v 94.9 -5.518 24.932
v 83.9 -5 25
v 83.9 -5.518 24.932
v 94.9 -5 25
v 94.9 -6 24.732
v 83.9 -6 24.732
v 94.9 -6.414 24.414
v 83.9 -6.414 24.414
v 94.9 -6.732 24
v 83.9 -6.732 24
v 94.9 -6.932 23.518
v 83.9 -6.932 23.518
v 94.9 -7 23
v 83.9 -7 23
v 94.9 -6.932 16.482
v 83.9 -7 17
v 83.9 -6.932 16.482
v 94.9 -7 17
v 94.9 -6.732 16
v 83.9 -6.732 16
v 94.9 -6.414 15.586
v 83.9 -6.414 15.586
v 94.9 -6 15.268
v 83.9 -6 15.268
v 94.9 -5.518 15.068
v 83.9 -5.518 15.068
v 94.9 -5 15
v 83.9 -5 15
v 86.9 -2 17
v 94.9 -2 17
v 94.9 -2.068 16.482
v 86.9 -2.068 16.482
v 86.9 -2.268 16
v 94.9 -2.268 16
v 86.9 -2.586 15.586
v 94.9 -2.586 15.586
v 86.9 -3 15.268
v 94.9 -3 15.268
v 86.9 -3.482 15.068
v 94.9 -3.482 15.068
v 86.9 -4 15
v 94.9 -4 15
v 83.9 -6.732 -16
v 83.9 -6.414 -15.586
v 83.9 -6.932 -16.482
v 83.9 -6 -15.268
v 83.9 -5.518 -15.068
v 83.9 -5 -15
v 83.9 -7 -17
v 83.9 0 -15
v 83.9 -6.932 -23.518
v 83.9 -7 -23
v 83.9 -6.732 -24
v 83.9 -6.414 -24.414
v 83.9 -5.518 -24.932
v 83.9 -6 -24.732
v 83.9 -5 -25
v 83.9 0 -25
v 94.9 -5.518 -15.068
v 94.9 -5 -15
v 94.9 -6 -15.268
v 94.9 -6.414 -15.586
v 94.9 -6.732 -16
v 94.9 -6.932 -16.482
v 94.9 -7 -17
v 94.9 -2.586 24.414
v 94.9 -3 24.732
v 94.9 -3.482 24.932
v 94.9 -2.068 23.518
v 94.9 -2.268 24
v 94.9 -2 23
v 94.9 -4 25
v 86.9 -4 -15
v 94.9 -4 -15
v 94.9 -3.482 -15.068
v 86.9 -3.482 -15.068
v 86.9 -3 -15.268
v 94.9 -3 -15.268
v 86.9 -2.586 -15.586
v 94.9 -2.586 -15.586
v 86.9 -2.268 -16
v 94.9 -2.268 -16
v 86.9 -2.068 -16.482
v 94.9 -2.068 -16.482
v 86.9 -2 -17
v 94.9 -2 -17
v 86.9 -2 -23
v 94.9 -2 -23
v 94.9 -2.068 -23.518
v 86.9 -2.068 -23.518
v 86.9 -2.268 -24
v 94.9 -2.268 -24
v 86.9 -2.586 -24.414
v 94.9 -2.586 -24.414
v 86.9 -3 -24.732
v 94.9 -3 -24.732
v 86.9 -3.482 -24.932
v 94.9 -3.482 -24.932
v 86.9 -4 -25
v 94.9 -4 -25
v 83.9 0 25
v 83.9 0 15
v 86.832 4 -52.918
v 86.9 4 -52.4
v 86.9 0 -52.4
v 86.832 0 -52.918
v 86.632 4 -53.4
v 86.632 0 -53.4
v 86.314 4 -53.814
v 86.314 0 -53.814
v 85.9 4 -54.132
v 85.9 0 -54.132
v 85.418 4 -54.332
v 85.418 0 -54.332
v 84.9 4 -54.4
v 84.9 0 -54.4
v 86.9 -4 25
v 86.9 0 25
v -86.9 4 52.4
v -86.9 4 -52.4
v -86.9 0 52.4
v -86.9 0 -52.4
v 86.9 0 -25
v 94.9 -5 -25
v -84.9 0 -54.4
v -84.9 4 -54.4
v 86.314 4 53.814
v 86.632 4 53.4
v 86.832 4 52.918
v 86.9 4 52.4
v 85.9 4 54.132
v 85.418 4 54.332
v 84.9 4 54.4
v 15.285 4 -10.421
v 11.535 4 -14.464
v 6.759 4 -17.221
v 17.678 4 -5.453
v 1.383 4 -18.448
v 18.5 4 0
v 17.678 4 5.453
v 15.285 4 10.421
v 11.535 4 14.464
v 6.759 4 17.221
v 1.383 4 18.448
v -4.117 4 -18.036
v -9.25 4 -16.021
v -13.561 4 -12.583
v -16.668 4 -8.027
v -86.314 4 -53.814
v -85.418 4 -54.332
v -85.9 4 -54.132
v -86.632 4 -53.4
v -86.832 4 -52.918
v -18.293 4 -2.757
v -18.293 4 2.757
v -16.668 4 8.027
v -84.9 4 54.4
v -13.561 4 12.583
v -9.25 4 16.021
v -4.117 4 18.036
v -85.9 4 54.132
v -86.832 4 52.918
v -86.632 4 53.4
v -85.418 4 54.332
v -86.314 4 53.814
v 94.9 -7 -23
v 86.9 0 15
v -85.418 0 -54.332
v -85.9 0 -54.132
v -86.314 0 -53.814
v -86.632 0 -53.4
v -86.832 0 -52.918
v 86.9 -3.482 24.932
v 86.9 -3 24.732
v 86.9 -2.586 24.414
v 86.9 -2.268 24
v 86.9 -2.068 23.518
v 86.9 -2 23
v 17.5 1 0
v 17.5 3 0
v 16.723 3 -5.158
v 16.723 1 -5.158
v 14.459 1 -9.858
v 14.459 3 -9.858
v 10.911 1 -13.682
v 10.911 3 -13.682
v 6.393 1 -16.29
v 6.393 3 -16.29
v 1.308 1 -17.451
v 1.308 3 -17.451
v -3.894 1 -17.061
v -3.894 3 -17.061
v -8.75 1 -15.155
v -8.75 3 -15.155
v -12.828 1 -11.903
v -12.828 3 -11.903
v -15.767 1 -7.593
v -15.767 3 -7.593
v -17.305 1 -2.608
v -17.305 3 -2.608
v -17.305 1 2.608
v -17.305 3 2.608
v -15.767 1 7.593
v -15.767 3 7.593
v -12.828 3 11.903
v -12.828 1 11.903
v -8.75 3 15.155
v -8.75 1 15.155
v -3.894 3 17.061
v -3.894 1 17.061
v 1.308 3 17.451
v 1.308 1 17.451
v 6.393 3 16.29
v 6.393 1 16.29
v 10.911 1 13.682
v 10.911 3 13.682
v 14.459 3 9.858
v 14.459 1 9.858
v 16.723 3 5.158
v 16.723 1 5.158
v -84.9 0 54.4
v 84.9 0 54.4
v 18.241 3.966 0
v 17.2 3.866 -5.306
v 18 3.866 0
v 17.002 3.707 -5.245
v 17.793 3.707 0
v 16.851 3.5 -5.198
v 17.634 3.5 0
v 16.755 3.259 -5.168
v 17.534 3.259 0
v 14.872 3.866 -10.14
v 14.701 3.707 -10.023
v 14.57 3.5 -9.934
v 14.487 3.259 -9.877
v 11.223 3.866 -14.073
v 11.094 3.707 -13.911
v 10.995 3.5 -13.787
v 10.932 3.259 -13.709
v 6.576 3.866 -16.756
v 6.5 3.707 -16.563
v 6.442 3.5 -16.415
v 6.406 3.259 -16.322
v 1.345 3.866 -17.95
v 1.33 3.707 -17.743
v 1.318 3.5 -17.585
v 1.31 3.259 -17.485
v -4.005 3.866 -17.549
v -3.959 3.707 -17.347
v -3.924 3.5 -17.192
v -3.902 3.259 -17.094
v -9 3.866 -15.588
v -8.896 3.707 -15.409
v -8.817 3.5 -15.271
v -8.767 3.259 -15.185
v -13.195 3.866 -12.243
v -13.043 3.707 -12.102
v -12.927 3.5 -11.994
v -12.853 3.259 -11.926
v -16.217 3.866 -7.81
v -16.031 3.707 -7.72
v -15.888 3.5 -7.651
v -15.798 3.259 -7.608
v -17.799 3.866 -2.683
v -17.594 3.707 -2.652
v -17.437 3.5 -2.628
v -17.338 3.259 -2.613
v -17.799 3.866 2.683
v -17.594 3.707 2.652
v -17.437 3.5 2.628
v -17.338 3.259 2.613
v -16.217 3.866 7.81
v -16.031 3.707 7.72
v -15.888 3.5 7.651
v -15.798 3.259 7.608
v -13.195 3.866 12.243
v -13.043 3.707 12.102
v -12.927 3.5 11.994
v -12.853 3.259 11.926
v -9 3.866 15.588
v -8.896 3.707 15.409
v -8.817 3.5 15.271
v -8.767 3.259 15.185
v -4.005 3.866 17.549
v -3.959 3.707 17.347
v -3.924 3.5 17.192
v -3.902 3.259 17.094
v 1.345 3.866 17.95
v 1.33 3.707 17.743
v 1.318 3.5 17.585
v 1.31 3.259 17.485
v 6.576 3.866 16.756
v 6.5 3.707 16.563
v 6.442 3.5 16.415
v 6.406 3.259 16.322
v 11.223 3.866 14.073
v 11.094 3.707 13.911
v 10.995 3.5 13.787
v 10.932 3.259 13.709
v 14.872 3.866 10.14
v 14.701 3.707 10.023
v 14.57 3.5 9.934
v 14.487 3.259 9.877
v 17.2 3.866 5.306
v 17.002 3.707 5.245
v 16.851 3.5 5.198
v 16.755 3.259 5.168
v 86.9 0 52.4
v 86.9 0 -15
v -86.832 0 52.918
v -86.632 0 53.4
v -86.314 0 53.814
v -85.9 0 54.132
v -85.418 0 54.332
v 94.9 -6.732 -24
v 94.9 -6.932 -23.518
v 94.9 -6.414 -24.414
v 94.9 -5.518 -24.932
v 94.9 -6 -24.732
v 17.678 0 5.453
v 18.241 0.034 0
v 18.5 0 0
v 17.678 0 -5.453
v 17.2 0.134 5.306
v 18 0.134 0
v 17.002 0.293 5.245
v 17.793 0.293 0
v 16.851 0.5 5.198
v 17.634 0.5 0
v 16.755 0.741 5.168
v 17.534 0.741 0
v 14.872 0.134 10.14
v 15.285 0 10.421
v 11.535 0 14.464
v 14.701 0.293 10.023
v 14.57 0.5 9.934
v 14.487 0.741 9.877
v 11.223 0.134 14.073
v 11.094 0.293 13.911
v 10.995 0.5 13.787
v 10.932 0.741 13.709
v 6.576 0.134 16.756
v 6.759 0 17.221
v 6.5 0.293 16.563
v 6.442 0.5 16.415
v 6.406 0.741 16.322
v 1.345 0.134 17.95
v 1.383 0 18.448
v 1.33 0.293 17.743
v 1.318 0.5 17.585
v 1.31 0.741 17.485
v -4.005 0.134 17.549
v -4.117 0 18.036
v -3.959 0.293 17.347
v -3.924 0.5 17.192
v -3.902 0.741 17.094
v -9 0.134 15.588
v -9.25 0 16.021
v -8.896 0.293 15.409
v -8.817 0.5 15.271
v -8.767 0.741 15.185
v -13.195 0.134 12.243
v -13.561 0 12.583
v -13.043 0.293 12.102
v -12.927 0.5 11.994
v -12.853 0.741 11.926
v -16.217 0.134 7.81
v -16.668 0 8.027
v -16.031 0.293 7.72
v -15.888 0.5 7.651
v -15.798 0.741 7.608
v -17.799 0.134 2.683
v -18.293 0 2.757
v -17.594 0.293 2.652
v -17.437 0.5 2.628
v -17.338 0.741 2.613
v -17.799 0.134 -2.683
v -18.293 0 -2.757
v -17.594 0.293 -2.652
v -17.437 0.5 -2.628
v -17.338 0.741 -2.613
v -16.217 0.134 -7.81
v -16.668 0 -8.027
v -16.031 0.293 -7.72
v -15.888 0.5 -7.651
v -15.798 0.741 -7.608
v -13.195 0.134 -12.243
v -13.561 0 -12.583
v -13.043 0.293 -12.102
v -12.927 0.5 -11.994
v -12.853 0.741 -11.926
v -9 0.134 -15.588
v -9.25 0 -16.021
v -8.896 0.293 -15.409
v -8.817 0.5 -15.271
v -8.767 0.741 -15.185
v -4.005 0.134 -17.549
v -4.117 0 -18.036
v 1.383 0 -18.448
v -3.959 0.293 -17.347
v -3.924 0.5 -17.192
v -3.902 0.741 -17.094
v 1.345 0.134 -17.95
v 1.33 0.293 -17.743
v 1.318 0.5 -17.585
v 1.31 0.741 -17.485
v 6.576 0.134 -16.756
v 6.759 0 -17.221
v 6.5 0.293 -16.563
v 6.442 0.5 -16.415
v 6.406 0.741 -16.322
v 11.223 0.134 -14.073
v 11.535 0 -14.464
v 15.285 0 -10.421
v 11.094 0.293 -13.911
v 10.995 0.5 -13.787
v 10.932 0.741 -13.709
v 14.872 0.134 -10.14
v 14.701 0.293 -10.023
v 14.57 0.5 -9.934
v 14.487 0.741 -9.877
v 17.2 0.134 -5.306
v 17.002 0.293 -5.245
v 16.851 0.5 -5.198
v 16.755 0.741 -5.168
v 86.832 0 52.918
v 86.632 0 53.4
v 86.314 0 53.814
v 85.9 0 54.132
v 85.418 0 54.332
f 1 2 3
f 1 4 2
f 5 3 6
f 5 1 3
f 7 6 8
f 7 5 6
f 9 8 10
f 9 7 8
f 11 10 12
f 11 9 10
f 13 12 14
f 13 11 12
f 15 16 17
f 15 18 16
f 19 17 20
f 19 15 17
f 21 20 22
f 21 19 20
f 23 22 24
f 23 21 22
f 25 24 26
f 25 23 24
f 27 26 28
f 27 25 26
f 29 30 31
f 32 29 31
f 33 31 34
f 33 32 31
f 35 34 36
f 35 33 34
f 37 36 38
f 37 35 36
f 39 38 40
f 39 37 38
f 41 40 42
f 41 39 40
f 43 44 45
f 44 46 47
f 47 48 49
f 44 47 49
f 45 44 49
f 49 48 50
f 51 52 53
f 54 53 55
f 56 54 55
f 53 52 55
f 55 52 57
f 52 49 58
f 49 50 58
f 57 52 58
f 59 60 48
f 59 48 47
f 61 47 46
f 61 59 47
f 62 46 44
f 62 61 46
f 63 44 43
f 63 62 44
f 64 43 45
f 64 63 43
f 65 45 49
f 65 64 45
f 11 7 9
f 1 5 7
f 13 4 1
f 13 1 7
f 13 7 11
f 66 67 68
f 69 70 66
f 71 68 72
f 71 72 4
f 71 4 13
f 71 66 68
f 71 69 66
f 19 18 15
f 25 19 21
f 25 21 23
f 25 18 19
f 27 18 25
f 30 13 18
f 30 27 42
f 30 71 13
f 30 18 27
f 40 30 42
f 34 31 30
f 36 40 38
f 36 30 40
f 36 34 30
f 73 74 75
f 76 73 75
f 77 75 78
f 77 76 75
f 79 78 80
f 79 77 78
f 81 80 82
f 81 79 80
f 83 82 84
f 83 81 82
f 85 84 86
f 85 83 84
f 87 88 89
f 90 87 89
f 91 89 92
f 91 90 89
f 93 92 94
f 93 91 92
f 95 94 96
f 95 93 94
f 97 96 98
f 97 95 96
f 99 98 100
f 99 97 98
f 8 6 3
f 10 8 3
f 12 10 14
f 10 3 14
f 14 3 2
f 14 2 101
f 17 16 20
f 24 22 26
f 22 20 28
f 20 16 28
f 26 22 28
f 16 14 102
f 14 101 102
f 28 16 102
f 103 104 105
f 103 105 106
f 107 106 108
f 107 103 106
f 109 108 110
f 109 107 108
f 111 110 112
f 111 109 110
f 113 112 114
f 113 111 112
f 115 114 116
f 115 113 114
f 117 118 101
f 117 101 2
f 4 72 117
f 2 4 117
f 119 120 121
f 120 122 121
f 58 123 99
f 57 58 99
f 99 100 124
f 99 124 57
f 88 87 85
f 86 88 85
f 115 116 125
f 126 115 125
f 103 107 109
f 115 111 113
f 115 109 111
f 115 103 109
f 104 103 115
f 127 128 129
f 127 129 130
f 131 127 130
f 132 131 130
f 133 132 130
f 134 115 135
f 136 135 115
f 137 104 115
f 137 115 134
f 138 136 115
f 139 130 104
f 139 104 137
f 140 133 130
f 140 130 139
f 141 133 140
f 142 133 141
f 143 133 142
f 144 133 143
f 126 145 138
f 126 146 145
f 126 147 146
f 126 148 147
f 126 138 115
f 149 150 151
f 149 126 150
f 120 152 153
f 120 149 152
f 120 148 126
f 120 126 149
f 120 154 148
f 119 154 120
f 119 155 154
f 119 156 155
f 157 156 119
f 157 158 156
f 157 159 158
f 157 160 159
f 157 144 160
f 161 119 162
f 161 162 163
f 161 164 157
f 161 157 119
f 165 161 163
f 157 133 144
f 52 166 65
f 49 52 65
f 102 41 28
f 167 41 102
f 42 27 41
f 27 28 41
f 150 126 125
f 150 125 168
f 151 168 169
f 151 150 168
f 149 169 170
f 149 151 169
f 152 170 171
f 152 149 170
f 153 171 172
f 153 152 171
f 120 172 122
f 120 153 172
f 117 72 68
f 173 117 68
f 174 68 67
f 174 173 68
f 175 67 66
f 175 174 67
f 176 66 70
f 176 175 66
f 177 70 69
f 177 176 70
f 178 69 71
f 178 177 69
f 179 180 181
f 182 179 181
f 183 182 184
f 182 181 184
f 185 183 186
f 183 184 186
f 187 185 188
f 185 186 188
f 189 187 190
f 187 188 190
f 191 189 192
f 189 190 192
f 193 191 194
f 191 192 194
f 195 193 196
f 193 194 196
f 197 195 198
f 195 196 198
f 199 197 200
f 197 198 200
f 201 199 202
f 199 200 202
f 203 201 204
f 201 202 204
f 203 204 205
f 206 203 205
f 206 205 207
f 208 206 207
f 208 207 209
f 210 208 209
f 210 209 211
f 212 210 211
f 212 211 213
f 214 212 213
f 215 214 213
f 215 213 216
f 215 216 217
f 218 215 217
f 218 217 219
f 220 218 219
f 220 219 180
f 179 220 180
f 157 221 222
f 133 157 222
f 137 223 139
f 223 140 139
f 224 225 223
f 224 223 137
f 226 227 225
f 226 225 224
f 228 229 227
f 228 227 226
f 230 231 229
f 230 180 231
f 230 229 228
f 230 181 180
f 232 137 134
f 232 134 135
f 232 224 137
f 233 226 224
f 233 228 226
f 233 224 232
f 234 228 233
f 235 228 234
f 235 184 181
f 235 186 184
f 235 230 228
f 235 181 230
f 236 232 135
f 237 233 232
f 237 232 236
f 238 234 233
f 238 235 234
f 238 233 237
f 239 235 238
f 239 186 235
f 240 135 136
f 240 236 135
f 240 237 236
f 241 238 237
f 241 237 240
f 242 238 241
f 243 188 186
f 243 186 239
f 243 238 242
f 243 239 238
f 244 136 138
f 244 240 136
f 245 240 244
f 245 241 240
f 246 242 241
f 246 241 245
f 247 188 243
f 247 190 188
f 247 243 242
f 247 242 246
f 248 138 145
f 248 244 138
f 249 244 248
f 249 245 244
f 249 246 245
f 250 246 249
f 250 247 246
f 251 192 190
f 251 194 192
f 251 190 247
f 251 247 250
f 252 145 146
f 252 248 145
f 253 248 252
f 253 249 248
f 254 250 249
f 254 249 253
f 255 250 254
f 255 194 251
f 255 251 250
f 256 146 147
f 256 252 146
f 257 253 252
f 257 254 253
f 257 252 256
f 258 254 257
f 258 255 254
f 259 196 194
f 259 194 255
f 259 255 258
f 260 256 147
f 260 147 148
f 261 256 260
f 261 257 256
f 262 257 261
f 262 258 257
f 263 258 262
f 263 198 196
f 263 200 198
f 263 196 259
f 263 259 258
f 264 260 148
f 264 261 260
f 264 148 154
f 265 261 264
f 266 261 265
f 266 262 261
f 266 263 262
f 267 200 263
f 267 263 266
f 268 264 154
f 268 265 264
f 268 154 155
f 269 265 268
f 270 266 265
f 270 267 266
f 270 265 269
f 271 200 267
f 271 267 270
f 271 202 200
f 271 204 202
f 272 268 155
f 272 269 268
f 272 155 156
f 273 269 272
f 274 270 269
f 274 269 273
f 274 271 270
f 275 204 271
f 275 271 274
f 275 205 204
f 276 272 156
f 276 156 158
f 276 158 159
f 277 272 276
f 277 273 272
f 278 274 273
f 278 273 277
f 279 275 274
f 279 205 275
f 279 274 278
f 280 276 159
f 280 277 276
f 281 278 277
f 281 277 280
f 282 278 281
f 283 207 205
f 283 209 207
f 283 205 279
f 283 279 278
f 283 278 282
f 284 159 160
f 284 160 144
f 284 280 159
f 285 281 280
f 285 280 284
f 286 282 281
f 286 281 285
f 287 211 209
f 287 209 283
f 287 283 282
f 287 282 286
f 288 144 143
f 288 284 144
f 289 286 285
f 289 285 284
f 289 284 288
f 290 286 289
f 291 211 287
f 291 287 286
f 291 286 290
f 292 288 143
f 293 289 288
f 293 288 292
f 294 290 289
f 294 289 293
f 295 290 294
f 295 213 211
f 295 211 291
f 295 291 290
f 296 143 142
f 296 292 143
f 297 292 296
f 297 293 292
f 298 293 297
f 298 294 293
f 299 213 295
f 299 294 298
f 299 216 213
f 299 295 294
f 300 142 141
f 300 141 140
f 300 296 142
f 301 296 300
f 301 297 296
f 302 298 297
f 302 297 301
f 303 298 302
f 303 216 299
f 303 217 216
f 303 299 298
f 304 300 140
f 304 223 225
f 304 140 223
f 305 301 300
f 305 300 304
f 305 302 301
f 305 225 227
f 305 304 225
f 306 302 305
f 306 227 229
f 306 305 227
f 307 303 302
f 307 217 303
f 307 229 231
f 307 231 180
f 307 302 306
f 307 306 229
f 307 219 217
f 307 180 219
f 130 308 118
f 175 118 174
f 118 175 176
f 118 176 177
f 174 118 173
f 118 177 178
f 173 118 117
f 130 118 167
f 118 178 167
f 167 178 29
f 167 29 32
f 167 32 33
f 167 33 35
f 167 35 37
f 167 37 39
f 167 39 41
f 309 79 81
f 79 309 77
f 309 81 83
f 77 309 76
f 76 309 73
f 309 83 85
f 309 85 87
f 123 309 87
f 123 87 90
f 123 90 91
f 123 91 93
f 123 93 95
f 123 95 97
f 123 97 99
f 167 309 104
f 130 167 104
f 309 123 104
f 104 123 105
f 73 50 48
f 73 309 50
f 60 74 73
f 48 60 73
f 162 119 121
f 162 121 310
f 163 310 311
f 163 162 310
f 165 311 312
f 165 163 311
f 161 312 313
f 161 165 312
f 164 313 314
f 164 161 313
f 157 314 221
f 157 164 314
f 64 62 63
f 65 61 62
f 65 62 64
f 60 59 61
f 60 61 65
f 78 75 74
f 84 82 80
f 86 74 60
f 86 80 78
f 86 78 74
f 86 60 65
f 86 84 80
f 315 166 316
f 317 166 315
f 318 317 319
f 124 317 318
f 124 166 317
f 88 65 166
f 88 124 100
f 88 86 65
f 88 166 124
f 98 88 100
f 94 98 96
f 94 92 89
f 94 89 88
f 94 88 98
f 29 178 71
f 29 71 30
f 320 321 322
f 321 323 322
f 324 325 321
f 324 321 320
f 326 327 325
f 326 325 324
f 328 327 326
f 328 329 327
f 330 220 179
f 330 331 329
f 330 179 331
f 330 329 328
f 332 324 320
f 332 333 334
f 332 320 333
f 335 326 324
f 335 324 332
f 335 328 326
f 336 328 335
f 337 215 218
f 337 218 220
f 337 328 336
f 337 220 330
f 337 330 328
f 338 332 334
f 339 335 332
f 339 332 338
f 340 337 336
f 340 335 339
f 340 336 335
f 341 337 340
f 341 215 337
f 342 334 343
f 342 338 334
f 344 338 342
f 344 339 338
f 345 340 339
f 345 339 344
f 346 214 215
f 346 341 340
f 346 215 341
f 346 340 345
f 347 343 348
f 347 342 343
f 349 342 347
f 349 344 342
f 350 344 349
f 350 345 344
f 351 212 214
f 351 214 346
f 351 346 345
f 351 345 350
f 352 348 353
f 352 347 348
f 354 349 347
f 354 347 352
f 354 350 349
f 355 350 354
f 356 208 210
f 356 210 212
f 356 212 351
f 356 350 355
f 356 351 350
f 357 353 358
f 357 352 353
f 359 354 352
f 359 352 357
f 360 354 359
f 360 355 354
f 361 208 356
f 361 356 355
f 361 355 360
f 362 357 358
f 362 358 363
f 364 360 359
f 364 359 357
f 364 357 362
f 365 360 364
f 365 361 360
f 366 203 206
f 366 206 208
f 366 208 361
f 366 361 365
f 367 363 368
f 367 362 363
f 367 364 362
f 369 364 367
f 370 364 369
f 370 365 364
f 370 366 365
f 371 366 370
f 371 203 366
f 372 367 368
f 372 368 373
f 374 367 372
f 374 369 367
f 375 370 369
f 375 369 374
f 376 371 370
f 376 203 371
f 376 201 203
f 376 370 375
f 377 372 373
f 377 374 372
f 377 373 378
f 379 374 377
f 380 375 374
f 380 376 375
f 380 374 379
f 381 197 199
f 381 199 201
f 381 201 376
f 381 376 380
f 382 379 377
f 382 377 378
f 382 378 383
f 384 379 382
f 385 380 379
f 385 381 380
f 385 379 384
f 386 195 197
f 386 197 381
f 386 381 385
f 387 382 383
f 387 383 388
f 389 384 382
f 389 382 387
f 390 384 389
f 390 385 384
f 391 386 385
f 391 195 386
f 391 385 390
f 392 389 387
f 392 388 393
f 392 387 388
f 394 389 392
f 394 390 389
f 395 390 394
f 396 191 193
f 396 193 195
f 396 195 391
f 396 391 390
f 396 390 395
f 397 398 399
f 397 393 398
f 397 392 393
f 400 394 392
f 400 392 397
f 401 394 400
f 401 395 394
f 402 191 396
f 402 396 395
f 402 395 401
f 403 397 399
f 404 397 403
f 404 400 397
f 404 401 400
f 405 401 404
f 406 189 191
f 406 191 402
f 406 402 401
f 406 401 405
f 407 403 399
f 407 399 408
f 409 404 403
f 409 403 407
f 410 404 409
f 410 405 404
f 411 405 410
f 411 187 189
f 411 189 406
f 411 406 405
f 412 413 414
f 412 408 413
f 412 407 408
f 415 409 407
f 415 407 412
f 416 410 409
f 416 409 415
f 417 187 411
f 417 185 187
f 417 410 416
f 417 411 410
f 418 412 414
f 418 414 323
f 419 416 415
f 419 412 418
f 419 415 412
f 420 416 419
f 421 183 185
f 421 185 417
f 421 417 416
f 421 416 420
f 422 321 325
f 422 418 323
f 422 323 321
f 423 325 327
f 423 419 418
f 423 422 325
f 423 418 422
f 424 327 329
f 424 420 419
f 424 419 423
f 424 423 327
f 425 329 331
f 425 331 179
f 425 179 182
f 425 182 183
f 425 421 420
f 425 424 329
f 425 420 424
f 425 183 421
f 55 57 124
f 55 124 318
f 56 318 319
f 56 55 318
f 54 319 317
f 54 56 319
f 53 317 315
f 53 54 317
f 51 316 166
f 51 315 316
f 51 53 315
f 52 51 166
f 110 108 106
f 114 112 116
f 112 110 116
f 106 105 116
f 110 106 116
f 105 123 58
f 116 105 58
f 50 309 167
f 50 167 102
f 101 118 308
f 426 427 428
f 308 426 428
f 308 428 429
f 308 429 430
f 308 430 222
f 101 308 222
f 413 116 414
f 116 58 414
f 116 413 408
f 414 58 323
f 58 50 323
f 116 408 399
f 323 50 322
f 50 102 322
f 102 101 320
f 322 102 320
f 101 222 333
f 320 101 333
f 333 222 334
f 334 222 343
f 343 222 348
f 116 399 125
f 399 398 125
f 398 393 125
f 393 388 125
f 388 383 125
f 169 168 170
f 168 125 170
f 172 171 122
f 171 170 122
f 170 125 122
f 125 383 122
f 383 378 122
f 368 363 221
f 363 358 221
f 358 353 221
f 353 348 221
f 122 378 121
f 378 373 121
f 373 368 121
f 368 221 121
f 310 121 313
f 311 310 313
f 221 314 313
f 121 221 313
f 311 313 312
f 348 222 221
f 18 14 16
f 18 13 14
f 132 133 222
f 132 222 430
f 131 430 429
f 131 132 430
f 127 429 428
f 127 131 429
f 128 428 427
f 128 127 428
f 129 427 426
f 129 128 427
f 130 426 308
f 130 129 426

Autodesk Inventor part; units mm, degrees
ref_plane "YZ Plane" through (0, 0, 0) normal (1, 0, 0) x (0, 1, 0)
ref_plane "XZ Plane" through (0, 0, 0) normal (0, 1, 0) x (-1, 0, 0)
ref_plane "XY Plane" through (0, 0, 0) normal (0, 0, 1) x (1, 0, 0)
sketch "Sketch1" plane through (0, 0, 0) normal (0, 1, 0) x (-1, 0, 0)
  line L0 (86.9, 54.4) -> (-86.9, 54.4)
  line L1 (-86.9, 54.4) -> (-86.9, -54.4)
  line L2 (-86.9, -54.4) -> (86.9, -54.4)
  line L3 (86.9, -54.4) -> (86.9, 54.4)
  line L4 (86.9, 54.4) -> (-86.9, -54.4) construction
  line L5 (-86.9, 54.4) -> (86.9, -54.4) construction
  point P0 (0, 0)
  dimension "d0" = 108.8
  dimension "d1" = 173.8
extrude "Extrusion1" add sketch "Sketch1" along normal blind 4
sketch "Sketch2" plane through (86.9, 0, 54.4) normal (1, 0, 0) x (0, 0, -1)
  line L0 (39.4, 6.5316) -> (69.4, 6.5316)
  line L1 (69.4, 6.5316) -> (69.4, -6.5316)
  line L2 (69.4, -6.5316) -> (39.4, -6.5316)
  line L3 (39.4, -6.5316) -> (39.4, 6.5316)
  line L4 (39.4, 6.5316) -> (69.4, -6.5316) construction
  line L5 (69.4, 6.5316) -> (39.4, -6.5316) construction
  line L6 (69.4, 0) -> (79.4, 0)
  line L7 (79.4, 0) -> (79.4, -2)
  line L8 (79.4, -2) -> (69.4, -2)
  line L9 (69.4, -2) -> (69.4, 0)
  line L10 (39.4, 0) -> (29.4, 0)
  line L11 (29.4, 0) -> (29.4, -2)
  line L12 (29.4, -2) -> (39.4, -2)
  line L13 (39.4, -2) -> (39.4, 0)
  line L14 (69.4, -2) -> (79.4, -2)
  line L15 (79.4, -2) -> (79.4, -7)
  line L16 (79.4, -7) -> (69.4, -7)
  line L17 (69.4, -7) -> (69.4, -2)
  line L18 (39.4, -2) -> (29.4, -2)
  line L19 (29.4, -2) -> (29.4, -7)
  line L20 (29.4, -7) -> (39.4, -7)
  line L21 (39.4, -7) -> (39.4, -2)
  point P0 (54.4, 0)
  point P1 (69.4, -6.5316)
  dimension "d4" = 30
  dimension "d5" = 2
  dimension "d6" = 2
  dimension "d7" = 5
  dimension "d8" = 10
  dimension "d9" = 5
  dimension "d10" = 10
  dimension "d11" = 10
  dimension "d12" = 10
extrude "Extrusion2" add sketch "Sketch2" against normal blind 3 contours L3 L12 L11 L10 | L6 L7 L8 L1 | L3 L21 L20 L19 L12 | L8 L15 L16 L17 L1
sketch "Sketch3" plane through (86.9, 0, -54.4) normal (1, 0, 0) x (0, 0, -1)
  line L0 (-79.4, -2) -> (-69.4, -2) projected
  line L1 (-69.4, -7) -> (-69.4, -2) projected
  line L2 (-79.4, -7) -> (-69.4, -7) projected
  line L3 (-79.4, -2) -> (-79.4, -7) projected
  line L4 (-29.4, -2) -> (-39.4, -2) projected
  line L5 (-29.4, -2) -> (-29.4, -7) projected
  line L6 (-29.4, -7) -> (-39.4, -7) projected
  line L7 (-39.4, -7) -> (-39.4, -2) projected
  line L8 (-79.4, -7) -> (-69.4, -7) projected
  line L9 (-77.4, -2) -> (-71.4, -2)
  line L10 (-69.4, -4) -> (-69.4, -5)
  line L11 (-71.4, -7) -> (-77.4, -7)
  line L12 (-79.4, -5) -> (-79.4, -4)
  line L13 (-37.4, -2) -> (-31.4, -2)
  line L14 (-29.4, -4) -> (-29.4, -5)
  line L15 (-31.4, -7) -> (-37.4, -7)
  line L16 (-39.4, -5) -> (-39.4, -4)
  arc A0 (-37.4, -2) -> (-39.4, -4) centre (-37.4, -4) ccw
  arc A1 (-29.4, -4) -> (-31.4, -2) centre (-31.4, -4) ccw
  arc A2 (-31.4, -7) -> (-29.4, -5) centre (-31.4, -5) ccw
  arc A3 (-39.4, -5) -> (-37.4, -7) centre (-37.4, -5) ccw
  arc A4 (-77.4, -2) -> (-79.4, -4) centre (-77.4, -4) ccw
  arc A5 (-69.4, -4) -> (-71.4, -2) centre (-71.4, -4) ccw
  arc A6 (-71.4, -7) -> (-69.4, -5) centre (-71.4, -5) ccw
  arc A7 (-79.4, -5) -> (-77.4, -7) centre (-77.4, -5) ccw
  point P0 (-54.4, 0)
  dimension "d15" = 2
extrude "Extrusion3" add sketch "Sketch3" along normal blind 8 contours L0 A5 L1 A6 L2 A7 L3 A4 | A1 L5 A2 L6 A3 L7 A0 L4
sketch "Sketch4" plane through (94.9, 0, -54.4) normal (1, 0, 0) x (0, 0, -1)
  line L0 (-77.4, -7) -> (-71.4, -7) projected
  arc A0 (-71.4, -7) -> (-69.4, -5) centre (-71.4, -5) ccw projected
  line L1 (-69.4, -5) -> (-69.4, -4) projected
  arc A1 (-69.4, -4) -> (-71.4, -2) centre (-71.4, -4) ccw projected
  line L2 (-71.4, -2) -> (-77.4, -2) projected
  arc A2 (-77.4, -2) -> (-79.4, -4) centre (-77.4, -4) ccw projected
  line L3 (-79.4, -4) -> (-79.4, -5) projected
  arc A3 (-79.4, -5) -> (-77.4, -7) centre (-77.4, -5) ccw projected
  line L4 (-37.4, -7) -> (-31.4, -7) projected
  arc A4 (-31.4, -7) -> (-29.4, -5) centre (-31.4, -5) ccw projected
  line L5 (-29.4, -5) -> (-29.4, -4) projected
  arc A5 (-29.4, -4) -> (-31.4, -2) centre (-31.4, -4) ccw projected
  line L6 (-31.4, -2) -> (-37.4, -2) projected
  arc A6 (-37.4, -2) -> (-39.4, -4) centre (-37.4, -4) ccw projected
  line L7 (-39.4, -4) -> (-39.4, -5) projected
  arc A7 (-39.4, -5) -> (-37.4, -7) centre (-37.4, -5) ccw projected
  line L8 (-79.4, 0) -> (-79.4, -4) projected
  line L9 (-79.4, -2) -> (-69.4, -2)
  line L10 (-69.4, -2) -> (-69.4, -8.3081)
  line L11 (-69.4, -8.3081) -> (-79.4, -8.3081)
  line L12 (-79.4, -8.3081) -> (-79.4, -2)
  line L13 (-39.4, -7) -> (-39.4, 0) projected
  line L14 (-39.4, -2) -> (-29.4, -2)
  line L15 (-29.4, -2) -> (-29.4, -9.9458)
  line L16 (-29.4, -9.9458) -> (-39.4, -9.9458)
  line L17 (-39.4, -9.9458) -> (-39.4, -2)
  point P0 (-54.4, 0)
  point P1 (-29.4, -5)
extrude "Extrusion4" cut sketch "Sketch4" against normal through all contours L0 A0 L10 L11 L12 A3 | L4 A4 L15 L16 L17 L13 A7
fillet "Fillet1" radius 2 4 edges at (86.9, 2, 54.4) (86.9, 2, -54.4) (-86.9, 2, -54.4) (-86.9, 2, 54.4)
sketch "Sketch5" plane through (0, 4, 0) normal (0, 1, 0) x (1, 0, 0)
  circle A0 centre (0, 0) radius 17.5
  dimension "d21" = 35
extrude "Extrusion5" cut sketch "Sketch5" against normal blind 10
fillet "Fillet2" radius 1 2 edges at (-17.5, 0, 0) (-17.5, 4, 0)
properties part number "tapa de caja"
